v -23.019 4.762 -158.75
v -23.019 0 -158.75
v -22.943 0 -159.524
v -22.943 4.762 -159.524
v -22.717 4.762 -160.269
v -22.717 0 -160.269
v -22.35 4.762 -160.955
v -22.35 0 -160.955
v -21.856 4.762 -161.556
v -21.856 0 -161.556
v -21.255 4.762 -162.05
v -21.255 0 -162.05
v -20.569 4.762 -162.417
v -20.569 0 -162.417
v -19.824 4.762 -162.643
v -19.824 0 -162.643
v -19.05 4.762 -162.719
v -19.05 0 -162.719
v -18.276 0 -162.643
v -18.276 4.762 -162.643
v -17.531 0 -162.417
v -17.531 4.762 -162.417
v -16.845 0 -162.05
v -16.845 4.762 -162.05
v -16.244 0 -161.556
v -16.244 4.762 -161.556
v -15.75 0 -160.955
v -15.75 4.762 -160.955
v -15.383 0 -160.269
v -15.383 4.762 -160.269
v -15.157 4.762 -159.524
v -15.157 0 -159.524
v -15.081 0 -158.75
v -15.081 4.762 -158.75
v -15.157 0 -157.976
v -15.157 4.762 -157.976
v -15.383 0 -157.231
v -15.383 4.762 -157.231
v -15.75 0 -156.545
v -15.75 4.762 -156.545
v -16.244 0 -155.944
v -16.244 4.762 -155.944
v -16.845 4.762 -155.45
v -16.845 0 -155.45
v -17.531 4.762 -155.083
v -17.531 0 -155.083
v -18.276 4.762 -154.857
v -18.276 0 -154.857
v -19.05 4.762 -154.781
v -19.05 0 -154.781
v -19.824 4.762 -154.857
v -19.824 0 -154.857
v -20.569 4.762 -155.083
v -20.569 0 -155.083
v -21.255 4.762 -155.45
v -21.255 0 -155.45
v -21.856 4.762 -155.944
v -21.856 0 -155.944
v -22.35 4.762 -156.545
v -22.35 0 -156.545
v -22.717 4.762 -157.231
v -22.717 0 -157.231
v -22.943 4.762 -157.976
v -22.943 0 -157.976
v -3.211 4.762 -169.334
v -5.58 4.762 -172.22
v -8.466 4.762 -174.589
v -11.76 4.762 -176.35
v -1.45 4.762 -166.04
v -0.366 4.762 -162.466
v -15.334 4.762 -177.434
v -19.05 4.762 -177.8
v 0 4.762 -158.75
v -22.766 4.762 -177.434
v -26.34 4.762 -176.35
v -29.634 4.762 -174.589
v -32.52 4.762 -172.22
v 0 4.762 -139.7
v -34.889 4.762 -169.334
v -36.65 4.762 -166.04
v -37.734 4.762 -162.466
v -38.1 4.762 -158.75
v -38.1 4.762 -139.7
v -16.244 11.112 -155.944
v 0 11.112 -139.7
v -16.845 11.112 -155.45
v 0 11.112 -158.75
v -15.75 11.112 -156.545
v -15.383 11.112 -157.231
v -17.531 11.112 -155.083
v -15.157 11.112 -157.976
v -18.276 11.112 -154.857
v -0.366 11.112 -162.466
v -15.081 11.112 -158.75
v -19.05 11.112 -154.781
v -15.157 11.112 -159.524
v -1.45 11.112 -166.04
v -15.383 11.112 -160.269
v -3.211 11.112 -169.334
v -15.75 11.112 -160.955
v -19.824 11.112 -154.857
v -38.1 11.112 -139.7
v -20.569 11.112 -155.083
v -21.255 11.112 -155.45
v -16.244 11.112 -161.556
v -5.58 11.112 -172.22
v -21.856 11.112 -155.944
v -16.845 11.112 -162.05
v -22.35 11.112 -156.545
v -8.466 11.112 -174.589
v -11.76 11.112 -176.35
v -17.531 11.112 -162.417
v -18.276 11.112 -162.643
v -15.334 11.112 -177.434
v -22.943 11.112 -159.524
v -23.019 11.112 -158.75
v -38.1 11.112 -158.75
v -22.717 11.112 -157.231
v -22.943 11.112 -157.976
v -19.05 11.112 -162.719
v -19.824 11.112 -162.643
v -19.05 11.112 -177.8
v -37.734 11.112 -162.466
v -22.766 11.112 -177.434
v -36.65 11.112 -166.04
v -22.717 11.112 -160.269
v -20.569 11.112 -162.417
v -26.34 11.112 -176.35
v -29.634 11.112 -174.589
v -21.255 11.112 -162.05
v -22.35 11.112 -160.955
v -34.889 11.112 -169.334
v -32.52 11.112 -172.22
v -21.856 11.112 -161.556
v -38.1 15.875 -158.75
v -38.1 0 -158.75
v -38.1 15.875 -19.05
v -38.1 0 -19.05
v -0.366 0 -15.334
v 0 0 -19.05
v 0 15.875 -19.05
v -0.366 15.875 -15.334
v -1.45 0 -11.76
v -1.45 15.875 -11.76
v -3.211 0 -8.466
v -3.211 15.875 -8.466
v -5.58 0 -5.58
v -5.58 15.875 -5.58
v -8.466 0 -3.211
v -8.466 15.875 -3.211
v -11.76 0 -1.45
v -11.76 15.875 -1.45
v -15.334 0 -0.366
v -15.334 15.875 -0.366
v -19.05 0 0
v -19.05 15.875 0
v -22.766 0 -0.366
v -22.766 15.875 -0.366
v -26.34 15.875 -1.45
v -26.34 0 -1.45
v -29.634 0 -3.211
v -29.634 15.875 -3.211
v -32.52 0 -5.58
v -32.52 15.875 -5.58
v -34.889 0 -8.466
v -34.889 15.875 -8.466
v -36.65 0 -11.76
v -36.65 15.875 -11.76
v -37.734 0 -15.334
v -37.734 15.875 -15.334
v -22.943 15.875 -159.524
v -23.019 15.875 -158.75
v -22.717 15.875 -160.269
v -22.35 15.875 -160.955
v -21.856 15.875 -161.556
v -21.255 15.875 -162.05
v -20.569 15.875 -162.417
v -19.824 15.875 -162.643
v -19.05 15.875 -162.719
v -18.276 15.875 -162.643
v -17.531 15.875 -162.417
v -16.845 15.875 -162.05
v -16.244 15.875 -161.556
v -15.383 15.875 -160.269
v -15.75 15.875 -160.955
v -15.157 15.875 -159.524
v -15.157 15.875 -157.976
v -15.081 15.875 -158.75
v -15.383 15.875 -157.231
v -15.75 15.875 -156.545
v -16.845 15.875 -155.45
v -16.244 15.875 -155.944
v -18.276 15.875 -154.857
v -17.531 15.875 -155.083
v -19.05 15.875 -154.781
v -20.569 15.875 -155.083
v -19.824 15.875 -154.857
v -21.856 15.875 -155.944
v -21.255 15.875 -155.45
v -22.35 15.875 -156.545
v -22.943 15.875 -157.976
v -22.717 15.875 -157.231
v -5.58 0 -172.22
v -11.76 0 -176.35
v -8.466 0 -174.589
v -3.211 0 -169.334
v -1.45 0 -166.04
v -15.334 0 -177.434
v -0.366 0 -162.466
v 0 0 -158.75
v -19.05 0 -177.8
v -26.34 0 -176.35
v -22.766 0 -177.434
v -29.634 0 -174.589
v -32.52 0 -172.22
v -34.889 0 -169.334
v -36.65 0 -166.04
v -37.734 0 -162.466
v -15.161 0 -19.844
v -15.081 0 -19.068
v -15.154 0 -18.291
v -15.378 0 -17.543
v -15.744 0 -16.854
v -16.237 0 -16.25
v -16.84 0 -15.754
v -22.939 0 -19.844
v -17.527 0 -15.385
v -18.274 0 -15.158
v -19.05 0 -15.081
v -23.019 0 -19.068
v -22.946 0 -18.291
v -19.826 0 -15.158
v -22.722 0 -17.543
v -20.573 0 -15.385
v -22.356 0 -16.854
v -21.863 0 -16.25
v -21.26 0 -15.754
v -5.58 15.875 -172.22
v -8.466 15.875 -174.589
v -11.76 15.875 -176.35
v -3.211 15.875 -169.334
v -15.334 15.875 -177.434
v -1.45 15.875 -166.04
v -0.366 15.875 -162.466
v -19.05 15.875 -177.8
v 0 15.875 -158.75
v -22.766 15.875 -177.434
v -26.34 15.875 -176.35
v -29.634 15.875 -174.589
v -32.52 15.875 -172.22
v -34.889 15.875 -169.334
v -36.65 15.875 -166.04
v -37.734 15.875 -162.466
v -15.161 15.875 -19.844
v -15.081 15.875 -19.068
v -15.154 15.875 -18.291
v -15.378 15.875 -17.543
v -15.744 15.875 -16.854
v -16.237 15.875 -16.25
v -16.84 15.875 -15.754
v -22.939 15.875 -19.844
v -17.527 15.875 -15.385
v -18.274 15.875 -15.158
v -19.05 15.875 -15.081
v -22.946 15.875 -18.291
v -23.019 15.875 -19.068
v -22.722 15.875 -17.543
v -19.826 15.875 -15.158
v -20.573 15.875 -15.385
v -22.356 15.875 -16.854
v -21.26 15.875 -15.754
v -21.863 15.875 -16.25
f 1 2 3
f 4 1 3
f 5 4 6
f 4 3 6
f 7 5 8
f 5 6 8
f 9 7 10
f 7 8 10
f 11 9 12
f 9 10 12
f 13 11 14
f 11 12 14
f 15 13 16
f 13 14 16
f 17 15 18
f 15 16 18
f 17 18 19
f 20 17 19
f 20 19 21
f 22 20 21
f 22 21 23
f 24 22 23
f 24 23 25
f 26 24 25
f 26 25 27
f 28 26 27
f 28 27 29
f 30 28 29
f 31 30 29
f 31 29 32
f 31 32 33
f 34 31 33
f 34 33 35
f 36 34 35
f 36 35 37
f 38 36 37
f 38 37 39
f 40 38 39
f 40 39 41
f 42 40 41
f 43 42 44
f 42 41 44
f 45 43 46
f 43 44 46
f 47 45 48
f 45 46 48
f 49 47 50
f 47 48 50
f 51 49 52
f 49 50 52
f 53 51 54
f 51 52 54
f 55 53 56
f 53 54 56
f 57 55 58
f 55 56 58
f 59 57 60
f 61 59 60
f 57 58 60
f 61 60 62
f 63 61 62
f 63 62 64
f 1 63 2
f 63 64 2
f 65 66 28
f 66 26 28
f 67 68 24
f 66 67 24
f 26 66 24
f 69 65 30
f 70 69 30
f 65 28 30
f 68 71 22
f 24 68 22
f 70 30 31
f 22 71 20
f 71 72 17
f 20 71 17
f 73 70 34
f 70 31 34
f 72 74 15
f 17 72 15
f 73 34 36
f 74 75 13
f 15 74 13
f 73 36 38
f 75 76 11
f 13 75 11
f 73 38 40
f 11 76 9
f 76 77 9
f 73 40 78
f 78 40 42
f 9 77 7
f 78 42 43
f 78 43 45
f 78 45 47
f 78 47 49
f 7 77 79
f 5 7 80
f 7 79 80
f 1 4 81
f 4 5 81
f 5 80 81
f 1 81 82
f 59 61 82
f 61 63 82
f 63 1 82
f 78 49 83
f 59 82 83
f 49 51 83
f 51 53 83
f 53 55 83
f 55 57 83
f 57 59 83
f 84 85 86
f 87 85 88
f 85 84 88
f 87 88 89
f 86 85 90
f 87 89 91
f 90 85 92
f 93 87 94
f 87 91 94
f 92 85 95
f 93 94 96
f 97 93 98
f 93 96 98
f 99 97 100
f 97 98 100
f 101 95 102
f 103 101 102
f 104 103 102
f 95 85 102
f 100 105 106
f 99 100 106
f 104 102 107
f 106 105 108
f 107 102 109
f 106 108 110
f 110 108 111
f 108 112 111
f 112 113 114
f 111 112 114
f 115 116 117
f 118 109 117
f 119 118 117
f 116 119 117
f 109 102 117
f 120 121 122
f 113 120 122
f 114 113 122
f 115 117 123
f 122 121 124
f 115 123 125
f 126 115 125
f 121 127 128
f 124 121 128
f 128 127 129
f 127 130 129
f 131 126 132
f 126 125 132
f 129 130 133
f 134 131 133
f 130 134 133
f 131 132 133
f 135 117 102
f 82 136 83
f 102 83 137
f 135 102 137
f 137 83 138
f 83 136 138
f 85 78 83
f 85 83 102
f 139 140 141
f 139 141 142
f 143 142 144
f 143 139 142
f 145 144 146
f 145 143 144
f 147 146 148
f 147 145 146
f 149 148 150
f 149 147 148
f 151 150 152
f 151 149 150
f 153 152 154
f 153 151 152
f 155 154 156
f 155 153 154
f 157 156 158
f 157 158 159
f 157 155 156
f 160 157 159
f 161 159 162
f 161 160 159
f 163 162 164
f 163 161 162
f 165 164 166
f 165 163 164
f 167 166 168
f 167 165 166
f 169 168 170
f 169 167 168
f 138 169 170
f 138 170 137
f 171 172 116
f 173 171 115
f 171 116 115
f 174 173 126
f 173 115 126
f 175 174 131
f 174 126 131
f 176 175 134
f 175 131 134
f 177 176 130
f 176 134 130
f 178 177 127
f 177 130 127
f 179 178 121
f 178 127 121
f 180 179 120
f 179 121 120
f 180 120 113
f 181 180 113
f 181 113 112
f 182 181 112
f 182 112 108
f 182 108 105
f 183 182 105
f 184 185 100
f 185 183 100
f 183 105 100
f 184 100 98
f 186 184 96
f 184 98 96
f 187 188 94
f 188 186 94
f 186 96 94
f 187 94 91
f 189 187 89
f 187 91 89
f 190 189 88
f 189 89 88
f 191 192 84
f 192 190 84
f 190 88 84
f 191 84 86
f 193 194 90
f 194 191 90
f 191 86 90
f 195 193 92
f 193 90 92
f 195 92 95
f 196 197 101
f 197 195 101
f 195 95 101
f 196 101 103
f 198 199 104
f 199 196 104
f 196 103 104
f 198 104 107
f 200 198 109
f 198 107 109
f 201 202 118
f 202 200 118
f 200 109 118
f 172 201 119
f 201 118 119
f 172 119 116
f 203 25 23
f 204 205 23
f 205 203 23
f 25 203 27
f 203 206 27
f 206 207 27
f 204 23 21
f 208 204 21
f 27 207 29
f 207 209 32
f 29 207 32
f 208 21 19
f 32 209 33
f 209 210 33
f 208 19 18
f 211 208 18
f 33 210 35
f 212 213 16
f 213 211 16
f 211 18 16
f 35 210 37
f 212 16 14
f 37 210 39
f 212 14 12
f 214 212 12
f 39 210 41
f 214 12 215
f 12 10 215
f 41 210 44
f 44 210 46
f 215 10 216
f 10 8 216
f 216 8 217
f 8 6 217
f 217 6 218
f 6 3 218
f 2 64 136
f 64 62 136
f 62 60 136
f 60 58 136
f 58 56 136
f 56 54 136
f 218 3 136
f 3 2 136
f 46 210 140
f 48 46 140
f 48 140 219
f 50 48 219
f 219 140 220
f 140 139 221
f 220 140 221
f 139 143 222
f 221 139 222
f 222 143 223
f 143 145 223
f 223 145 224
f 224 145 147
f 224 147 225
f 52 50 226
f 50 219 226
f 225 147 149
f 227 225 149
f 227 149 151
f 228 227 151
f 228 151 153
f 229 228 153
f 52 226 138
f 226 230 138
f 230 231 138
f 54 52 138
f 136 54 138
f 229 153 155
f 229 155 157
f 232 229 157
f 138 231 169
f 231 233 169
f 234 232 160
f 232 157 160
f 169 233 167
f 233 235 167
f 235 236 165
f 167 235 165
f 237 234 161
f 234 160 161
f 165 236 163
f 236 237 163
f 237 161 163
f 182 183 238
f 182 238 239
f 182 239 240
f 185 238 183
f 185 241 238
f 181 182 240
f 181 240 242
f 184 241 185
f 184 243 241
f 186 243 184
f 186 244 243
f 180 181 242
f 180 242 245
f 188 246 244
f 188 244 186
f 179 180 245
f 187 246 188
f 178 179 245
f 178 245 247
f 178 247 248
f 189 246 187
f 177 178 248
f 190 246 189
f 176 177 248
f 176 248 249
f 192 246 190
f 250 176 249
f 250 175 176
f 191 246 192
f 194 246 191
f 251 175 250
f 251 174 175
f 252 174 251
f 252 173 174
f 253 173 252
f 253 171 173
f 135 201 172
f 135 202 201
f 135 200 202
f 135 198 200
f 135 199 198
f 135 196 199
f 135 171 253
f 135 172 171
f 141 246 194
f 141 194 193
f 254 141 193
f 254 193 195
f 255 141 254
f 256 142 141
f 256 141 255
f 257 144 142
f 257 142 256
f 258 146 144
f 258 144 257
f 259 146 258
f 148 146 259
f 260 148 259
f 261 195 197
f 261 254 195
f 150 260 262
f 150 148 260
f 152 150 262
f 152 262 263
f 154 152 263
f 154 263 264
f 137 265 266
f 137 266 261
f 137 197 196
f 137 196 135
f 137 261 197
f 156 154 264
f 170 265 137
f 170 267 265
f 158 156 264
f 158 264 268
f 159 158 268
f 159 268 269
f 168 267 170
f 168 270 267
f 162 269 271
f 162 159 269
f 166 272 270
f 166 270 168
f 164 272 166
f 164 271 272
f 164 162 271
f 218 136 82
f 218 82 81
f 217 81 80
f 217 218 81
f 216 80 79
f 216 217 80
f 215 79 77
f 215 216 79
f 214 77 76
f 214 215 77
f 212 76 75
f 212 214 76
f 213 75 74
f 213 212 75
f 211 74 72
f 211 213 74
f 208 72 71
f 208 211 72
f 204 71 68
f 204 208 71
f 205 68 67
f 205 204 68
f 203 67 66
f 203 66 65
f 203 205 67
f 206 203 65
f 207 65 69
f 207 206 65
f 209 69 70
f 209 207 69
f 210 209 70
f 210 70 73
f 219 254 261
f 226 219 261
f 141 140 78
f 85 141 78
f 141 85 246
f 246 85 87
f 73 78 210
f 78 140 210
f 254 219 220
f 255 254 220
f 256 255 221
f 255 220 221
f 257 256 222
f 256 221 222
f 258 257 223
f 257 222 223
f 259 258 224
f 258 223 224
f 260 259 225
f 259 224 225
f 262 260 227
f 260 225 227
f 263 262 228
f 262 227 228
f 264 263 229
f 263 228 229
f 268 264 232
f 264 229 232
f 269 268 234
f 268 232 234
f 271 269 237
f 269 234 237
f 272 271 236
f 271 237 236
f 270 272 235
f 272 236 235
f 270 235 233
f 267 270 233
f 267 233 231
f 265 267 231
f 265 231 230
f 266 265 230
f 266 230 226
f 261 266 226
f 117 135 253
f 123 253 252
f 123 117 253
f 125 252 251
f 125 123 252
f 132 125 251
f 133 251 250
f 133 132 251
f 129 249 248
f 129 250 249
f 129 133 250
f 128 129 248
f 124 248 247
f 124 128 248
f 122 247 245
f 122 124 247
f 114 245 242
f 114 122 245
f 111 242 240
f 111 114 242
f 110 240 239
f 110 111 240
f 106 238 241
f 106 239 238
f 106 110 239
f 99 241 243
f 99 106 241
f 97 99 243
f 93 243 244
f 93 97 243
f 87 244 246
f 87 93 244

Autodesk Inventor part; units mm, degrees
ref_plane "YZ Plane" through (0, 0, 0) normal (1, 0, 0) x (0, 1, 0)
ref_plane "XZ Plane" through (0, 0, 0) normal (0, 1, 0) x (-1, 0, 0)
ref_plane "XY Plane" through (0, 0, 0) normal (0, 0, 1) x (1, 0, 0)
sketch "Sketch1" plane through (0, 0, 0) normal (0, 1, 0) x (-1, 0, 0)
  line L0 (0, -19.05) -> (0, -158.75)
  line L1 (19.05, -177.8) -> (19.05, -177.8)
  line L2 (38.1, -158.75) -> (38.1, -19.05)
  line L3 (19.05, 0) -> (19.05, 0)
  arc A0 (0, -158.75) -> (19.05, -177.8) centre (19.05, -158.75) ccw
  arc A1 (19.05, -177.8) -> (38.1, -158.75) centre (19.05, -158.75) ccw
  arc A2 (38.1, -19.05) -> (19.05, 0) centre (19.05, -19.05) ccw
  arc A3 (19.05, 0) -> (0, -19.05) centre (19.05, -19.05) ccw
  circle A4 centre (19.05, -19.05) radius 3.9688
  circle A5 centre (19.05, -158.75) radius 3.9688
  point P0 (0, 0)
  point P1 (0, -177.8)
  point P2 (38.1, -177.8)
  dimension "d0" = 38.1
  dimension "LengthOfArm_Thiner" = 177.8
  dimension "d2" = 19.05
  dimension "Motor_Shaft_Diameter" = 7.9375
  dimension "d4" = 7.9375
extrude "Extrusion1" add sketch "Sketch1" along normal blind 15.875
sketch "Sketch2" plane through (-38.1, 0, -158.75) normal (-1, 0, 0) x (0, 0, 1)
  line L0 (-19.05, 0) -> (-19.05, 15.875) projected
  line L1 (-57.15, 4.7625) -> (19.05, 4.7625)
  line L2 (19.05, 4.7625) -> (19.05, 11.1125)
  line L3 (19.05, 11.1125) -> (-57.15, 11.1125)
  line L4 (-57.15, 11.1125) -> (-57.15, 4.7625)
  line L5 (-57.15, 4.7625) -> (19.05, 11.1125) construction
  line L6 (19.05, 4.7625) -> (-57.15, 11.1125) construction
  point P0 (158.75, 0)
  point P1 (-19.05, 7.9375)
  dimension "d7" = 6.35
  dimension "d8" = 38.1
extrude "Extrusion2" cut sketch "Sketch2" against normal up to next
sketch "Sketch3" plane through (0, 15.875, 0) normal (0, 1, 0) x (1, 0, 0)
  circle A0 centre (-19.05, 19.05) radius 3.9687 projected
  line L0 (-24.4521, 26.1937) -> (-13.6479, 26.1937)
  line L1 (-13.6479, 26.1937) -> (-13.6479, 19.8437)
  line L2 (-13.6479, 19.8437) -> (-24.4521, 19.8437)
  line L3 (-24.4521, 19.8437) -> (-24.4521, 26.1937)
  line L4 (-24.4521, 26.1937) -> (-13.6479, 19.8437) construction
  line L5 (-13.6479, 26.1937) -> (-24.4521, 19.8437) construction
  point P0 (0, 0)
  point P1 (-19.05, 23.0187)
  dimension "d11" = 6.35
extrude "Extrusion3" add sketch "Sketch3" against normal up to surface (15.875 mm away) contours L2 A0 | A0 L2 L3 L0 L1 picked at (-18.8857, 21.5143)
properties part number "Arm"
